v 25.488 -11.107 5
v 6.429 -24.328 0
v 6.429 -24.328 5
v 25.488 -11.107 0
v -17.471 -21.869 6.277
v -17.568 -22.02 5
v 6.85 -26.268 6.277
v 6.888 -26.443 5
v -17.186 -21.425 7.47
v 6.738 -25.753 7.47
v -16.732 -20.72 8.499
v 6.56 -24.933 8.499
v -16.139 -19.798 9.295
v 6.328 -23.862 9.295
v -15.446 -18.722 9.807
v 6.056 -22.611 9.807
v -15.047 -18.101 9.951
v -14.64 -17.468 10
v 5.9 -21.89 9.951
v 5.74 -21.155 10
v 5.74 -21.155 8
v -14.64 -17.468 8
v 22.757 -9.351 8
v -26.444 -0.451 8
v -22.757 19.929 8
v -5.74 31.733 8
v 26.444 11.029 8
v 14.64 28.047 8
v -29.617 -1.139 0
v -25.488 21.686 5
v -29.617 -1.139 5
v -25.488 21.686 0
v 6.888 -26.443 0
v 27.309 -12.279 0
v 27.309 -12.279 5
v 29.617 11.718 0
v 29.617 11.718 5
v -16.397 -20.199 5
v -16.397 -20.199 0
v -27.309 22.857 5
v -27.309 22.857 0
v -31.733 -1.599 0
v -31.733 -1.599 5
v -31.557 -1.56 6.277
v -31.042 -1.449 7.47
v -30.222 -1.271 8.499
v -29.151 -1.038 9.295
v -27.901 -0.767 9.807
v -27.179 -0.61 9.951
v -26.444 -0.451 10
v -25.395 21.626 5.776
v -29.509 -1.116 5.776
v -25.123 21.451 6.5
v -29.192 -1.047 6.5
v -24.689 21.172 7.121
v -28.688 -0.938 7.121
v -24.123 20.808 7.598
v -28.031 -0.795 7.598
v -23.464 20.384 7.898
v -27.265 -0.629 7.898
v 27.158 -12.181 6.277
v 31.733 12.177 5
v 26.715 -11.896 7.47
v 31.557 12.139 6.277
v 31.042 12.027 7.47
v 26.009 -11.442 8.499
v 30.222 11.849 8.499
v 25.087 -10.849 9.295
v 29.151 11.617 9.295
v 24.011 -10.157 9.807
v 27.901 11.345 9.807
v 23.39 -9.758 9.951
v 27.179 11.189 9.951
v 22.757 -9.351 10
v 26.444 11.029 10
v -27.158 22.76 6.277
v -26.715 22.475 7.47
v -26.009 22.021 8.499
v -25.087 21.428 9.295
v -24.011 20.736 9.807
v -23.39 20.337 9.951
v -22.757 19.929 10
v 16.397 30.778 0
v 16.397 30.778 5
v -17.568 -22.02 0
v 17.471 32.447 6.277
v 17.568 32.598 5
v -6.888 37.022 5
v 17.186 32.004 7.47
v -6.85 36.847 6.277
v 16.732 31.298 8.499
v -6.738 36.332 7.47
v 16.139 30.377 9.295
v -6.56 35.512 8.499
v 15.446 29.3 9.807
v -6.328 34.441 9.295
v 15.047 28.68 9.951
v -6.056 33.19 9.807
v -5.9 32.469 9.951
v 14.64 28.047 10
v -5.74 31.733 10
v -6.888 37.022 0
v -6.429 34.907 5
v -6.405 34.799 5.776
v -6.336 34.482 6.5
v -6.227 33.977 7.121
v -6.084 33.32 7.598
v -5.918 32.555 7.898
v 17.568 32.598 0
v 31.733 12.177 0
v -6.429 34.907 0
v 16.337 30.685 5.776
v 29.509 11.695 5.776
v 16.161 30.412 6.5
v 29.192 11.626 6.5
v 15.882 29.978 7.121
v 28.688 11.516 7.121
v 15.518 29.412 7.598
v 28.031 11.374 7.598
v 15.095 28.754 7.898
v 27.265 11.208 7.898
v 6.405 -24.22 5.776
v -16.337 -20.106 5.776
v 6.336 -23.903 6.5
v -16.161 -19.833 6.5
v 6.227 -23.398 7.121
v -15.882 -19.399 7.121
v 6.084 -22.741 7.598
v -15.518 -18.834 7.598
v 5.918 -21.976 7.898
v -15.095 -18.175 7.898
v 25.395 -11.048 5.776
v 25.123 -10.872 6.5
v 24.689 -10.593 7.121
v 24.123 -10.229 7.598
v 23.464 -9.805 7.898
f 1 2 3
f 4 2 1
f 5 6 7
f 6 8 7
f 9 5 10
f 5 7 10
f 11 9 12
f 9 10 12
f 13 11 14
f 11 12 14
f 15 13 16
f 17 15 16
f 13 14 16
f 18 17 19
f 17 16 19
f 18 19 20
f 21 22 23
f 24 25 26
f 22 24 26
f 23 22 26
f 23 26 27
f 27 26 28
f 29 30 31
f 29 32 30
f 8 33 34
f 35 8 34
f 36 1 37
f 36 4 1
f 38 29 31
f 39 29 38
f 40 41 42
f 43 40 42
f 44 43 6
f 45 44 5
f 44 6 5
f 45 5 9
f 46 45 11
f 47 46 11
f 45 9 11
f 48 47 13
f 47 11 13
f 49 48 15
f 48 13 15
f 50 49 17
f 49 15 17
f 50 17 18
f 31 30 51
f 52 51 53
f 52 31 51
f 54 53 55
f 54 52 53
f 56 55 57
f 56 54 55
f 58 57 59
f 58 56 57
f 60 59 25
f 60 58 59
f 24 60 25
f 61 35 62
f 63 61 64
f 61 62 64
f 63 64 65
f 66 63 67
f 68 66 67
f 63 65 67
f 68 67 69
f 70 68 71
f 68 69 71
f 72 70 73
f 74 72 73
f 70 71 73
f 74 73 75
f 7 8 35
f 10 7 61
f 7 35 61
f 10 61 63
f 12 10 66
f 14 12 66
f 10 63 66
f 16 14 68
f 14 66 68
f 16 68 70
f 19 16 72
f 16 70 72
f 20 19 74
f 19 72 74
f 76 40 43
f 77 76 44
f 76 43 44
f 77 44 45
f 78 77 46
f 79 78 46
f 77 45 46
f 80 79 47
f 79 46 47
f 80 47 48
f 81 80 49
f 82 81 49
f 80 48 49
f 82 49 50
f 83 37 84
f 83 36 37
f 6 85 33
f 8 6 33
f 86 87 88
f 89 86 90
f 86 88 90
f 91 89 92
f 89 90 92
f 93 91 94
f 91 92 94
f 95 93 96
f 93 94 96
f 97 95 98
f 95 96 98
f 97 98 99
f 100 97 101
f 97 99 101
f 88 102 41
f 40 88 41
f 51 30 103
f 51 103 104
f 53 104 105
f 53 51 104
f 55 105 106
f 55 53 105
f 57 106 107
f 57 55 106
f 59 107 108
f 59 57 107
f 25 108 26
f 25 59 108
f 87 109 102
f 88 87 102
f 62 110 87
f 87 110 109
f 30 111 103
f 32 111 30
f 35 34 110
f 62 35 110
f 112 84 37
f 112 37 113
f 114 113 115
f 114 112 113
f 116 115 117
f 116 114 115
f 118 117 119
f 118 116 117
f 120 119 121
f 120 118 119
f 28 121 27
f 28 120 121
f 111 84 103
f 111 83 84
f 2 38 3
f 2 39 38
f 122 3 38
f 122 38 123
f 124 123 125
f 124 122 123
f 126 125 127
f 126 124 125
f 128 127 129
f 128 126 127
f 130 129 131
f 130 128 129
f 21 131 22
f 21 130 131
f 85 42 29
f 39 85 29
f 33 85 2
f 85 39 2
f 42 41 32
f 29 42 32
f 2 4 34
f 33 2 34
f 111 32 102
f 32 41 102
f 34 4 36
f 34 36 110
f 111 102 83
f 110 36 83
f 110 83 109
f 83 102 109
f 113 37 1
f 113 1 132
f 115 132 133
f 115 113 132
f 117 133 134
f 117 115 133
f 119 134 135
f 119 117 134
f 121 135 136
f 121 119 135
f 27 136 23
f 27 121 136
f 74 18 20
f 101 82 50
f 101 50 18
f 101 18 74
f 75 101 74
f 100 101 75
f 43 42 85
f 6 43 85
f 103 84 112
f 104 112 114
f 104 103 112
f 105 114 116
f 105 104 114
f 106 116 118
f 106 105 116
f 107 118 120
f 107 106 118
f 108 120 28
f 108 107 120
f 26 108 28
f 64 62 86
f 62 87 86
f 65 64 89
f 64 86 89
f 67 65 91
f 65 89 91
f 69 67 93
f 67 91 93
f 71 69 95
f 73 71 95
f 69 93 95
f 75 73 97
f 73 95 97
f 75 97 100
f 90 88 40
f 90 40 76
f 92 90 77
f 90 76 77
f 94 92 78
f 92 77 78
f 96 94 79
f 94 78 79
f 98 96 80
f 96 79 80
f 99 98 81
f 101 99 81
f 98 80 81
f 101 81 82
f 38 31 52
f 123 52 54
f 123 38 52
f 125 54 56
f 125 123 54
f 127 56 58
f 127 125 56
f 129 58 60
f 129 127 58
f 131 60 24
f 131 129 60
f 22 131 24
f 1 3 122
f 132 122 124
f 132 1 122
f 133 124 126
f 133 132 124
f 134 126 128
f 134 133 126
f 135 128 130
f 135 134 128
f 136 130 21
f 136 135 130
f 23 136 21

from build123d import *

# Parameters (mm, degrees)
F1_DEPTH = 10
F2_R     = 5
F3_T     = -2


with BuildPart() as f1:
    # F0 (on Top) → F1 (new body)
    with BuildSketch(Plane.XY):
        Polygon((-27.30897, 22.857411), (-31.732832, -1.598505), (-17.568031, -22.019591), (6.887884, -26.443453), (27.30897, -12.278652), (31.732832, 12.177263), (17.568031, 32.59835), (-6.887884, 37.022211), align=None)
    extrude(amount=F1_DEPTH)

    # F2
    f2_edges = [f1.edges().sort_by_distance(p)[0] for p in [
        (-5.340074, -24.231522, 10),
        (17.098427, -19.361053, 10),
        (29.520901, -0.050694, 10),
        (24.650432, 22.387806, 10),
        (5.340074, 34.810281, 10),
        (-17.098427, 29.939811, 10),
        (-29.520901, 10.629453, 10),
        (-24.650432, -11.809048, 10),
    ]]
    fillet(f2_edges, radius=F2_R)

    # F3
    f3_openings = [f1.faces().sort_by_distance(p)[0] for p in [
        (0, 5.289379, 0),
    ]]
    offset(amount=F3_T, openings=f3_openings)


solid = f1.part
